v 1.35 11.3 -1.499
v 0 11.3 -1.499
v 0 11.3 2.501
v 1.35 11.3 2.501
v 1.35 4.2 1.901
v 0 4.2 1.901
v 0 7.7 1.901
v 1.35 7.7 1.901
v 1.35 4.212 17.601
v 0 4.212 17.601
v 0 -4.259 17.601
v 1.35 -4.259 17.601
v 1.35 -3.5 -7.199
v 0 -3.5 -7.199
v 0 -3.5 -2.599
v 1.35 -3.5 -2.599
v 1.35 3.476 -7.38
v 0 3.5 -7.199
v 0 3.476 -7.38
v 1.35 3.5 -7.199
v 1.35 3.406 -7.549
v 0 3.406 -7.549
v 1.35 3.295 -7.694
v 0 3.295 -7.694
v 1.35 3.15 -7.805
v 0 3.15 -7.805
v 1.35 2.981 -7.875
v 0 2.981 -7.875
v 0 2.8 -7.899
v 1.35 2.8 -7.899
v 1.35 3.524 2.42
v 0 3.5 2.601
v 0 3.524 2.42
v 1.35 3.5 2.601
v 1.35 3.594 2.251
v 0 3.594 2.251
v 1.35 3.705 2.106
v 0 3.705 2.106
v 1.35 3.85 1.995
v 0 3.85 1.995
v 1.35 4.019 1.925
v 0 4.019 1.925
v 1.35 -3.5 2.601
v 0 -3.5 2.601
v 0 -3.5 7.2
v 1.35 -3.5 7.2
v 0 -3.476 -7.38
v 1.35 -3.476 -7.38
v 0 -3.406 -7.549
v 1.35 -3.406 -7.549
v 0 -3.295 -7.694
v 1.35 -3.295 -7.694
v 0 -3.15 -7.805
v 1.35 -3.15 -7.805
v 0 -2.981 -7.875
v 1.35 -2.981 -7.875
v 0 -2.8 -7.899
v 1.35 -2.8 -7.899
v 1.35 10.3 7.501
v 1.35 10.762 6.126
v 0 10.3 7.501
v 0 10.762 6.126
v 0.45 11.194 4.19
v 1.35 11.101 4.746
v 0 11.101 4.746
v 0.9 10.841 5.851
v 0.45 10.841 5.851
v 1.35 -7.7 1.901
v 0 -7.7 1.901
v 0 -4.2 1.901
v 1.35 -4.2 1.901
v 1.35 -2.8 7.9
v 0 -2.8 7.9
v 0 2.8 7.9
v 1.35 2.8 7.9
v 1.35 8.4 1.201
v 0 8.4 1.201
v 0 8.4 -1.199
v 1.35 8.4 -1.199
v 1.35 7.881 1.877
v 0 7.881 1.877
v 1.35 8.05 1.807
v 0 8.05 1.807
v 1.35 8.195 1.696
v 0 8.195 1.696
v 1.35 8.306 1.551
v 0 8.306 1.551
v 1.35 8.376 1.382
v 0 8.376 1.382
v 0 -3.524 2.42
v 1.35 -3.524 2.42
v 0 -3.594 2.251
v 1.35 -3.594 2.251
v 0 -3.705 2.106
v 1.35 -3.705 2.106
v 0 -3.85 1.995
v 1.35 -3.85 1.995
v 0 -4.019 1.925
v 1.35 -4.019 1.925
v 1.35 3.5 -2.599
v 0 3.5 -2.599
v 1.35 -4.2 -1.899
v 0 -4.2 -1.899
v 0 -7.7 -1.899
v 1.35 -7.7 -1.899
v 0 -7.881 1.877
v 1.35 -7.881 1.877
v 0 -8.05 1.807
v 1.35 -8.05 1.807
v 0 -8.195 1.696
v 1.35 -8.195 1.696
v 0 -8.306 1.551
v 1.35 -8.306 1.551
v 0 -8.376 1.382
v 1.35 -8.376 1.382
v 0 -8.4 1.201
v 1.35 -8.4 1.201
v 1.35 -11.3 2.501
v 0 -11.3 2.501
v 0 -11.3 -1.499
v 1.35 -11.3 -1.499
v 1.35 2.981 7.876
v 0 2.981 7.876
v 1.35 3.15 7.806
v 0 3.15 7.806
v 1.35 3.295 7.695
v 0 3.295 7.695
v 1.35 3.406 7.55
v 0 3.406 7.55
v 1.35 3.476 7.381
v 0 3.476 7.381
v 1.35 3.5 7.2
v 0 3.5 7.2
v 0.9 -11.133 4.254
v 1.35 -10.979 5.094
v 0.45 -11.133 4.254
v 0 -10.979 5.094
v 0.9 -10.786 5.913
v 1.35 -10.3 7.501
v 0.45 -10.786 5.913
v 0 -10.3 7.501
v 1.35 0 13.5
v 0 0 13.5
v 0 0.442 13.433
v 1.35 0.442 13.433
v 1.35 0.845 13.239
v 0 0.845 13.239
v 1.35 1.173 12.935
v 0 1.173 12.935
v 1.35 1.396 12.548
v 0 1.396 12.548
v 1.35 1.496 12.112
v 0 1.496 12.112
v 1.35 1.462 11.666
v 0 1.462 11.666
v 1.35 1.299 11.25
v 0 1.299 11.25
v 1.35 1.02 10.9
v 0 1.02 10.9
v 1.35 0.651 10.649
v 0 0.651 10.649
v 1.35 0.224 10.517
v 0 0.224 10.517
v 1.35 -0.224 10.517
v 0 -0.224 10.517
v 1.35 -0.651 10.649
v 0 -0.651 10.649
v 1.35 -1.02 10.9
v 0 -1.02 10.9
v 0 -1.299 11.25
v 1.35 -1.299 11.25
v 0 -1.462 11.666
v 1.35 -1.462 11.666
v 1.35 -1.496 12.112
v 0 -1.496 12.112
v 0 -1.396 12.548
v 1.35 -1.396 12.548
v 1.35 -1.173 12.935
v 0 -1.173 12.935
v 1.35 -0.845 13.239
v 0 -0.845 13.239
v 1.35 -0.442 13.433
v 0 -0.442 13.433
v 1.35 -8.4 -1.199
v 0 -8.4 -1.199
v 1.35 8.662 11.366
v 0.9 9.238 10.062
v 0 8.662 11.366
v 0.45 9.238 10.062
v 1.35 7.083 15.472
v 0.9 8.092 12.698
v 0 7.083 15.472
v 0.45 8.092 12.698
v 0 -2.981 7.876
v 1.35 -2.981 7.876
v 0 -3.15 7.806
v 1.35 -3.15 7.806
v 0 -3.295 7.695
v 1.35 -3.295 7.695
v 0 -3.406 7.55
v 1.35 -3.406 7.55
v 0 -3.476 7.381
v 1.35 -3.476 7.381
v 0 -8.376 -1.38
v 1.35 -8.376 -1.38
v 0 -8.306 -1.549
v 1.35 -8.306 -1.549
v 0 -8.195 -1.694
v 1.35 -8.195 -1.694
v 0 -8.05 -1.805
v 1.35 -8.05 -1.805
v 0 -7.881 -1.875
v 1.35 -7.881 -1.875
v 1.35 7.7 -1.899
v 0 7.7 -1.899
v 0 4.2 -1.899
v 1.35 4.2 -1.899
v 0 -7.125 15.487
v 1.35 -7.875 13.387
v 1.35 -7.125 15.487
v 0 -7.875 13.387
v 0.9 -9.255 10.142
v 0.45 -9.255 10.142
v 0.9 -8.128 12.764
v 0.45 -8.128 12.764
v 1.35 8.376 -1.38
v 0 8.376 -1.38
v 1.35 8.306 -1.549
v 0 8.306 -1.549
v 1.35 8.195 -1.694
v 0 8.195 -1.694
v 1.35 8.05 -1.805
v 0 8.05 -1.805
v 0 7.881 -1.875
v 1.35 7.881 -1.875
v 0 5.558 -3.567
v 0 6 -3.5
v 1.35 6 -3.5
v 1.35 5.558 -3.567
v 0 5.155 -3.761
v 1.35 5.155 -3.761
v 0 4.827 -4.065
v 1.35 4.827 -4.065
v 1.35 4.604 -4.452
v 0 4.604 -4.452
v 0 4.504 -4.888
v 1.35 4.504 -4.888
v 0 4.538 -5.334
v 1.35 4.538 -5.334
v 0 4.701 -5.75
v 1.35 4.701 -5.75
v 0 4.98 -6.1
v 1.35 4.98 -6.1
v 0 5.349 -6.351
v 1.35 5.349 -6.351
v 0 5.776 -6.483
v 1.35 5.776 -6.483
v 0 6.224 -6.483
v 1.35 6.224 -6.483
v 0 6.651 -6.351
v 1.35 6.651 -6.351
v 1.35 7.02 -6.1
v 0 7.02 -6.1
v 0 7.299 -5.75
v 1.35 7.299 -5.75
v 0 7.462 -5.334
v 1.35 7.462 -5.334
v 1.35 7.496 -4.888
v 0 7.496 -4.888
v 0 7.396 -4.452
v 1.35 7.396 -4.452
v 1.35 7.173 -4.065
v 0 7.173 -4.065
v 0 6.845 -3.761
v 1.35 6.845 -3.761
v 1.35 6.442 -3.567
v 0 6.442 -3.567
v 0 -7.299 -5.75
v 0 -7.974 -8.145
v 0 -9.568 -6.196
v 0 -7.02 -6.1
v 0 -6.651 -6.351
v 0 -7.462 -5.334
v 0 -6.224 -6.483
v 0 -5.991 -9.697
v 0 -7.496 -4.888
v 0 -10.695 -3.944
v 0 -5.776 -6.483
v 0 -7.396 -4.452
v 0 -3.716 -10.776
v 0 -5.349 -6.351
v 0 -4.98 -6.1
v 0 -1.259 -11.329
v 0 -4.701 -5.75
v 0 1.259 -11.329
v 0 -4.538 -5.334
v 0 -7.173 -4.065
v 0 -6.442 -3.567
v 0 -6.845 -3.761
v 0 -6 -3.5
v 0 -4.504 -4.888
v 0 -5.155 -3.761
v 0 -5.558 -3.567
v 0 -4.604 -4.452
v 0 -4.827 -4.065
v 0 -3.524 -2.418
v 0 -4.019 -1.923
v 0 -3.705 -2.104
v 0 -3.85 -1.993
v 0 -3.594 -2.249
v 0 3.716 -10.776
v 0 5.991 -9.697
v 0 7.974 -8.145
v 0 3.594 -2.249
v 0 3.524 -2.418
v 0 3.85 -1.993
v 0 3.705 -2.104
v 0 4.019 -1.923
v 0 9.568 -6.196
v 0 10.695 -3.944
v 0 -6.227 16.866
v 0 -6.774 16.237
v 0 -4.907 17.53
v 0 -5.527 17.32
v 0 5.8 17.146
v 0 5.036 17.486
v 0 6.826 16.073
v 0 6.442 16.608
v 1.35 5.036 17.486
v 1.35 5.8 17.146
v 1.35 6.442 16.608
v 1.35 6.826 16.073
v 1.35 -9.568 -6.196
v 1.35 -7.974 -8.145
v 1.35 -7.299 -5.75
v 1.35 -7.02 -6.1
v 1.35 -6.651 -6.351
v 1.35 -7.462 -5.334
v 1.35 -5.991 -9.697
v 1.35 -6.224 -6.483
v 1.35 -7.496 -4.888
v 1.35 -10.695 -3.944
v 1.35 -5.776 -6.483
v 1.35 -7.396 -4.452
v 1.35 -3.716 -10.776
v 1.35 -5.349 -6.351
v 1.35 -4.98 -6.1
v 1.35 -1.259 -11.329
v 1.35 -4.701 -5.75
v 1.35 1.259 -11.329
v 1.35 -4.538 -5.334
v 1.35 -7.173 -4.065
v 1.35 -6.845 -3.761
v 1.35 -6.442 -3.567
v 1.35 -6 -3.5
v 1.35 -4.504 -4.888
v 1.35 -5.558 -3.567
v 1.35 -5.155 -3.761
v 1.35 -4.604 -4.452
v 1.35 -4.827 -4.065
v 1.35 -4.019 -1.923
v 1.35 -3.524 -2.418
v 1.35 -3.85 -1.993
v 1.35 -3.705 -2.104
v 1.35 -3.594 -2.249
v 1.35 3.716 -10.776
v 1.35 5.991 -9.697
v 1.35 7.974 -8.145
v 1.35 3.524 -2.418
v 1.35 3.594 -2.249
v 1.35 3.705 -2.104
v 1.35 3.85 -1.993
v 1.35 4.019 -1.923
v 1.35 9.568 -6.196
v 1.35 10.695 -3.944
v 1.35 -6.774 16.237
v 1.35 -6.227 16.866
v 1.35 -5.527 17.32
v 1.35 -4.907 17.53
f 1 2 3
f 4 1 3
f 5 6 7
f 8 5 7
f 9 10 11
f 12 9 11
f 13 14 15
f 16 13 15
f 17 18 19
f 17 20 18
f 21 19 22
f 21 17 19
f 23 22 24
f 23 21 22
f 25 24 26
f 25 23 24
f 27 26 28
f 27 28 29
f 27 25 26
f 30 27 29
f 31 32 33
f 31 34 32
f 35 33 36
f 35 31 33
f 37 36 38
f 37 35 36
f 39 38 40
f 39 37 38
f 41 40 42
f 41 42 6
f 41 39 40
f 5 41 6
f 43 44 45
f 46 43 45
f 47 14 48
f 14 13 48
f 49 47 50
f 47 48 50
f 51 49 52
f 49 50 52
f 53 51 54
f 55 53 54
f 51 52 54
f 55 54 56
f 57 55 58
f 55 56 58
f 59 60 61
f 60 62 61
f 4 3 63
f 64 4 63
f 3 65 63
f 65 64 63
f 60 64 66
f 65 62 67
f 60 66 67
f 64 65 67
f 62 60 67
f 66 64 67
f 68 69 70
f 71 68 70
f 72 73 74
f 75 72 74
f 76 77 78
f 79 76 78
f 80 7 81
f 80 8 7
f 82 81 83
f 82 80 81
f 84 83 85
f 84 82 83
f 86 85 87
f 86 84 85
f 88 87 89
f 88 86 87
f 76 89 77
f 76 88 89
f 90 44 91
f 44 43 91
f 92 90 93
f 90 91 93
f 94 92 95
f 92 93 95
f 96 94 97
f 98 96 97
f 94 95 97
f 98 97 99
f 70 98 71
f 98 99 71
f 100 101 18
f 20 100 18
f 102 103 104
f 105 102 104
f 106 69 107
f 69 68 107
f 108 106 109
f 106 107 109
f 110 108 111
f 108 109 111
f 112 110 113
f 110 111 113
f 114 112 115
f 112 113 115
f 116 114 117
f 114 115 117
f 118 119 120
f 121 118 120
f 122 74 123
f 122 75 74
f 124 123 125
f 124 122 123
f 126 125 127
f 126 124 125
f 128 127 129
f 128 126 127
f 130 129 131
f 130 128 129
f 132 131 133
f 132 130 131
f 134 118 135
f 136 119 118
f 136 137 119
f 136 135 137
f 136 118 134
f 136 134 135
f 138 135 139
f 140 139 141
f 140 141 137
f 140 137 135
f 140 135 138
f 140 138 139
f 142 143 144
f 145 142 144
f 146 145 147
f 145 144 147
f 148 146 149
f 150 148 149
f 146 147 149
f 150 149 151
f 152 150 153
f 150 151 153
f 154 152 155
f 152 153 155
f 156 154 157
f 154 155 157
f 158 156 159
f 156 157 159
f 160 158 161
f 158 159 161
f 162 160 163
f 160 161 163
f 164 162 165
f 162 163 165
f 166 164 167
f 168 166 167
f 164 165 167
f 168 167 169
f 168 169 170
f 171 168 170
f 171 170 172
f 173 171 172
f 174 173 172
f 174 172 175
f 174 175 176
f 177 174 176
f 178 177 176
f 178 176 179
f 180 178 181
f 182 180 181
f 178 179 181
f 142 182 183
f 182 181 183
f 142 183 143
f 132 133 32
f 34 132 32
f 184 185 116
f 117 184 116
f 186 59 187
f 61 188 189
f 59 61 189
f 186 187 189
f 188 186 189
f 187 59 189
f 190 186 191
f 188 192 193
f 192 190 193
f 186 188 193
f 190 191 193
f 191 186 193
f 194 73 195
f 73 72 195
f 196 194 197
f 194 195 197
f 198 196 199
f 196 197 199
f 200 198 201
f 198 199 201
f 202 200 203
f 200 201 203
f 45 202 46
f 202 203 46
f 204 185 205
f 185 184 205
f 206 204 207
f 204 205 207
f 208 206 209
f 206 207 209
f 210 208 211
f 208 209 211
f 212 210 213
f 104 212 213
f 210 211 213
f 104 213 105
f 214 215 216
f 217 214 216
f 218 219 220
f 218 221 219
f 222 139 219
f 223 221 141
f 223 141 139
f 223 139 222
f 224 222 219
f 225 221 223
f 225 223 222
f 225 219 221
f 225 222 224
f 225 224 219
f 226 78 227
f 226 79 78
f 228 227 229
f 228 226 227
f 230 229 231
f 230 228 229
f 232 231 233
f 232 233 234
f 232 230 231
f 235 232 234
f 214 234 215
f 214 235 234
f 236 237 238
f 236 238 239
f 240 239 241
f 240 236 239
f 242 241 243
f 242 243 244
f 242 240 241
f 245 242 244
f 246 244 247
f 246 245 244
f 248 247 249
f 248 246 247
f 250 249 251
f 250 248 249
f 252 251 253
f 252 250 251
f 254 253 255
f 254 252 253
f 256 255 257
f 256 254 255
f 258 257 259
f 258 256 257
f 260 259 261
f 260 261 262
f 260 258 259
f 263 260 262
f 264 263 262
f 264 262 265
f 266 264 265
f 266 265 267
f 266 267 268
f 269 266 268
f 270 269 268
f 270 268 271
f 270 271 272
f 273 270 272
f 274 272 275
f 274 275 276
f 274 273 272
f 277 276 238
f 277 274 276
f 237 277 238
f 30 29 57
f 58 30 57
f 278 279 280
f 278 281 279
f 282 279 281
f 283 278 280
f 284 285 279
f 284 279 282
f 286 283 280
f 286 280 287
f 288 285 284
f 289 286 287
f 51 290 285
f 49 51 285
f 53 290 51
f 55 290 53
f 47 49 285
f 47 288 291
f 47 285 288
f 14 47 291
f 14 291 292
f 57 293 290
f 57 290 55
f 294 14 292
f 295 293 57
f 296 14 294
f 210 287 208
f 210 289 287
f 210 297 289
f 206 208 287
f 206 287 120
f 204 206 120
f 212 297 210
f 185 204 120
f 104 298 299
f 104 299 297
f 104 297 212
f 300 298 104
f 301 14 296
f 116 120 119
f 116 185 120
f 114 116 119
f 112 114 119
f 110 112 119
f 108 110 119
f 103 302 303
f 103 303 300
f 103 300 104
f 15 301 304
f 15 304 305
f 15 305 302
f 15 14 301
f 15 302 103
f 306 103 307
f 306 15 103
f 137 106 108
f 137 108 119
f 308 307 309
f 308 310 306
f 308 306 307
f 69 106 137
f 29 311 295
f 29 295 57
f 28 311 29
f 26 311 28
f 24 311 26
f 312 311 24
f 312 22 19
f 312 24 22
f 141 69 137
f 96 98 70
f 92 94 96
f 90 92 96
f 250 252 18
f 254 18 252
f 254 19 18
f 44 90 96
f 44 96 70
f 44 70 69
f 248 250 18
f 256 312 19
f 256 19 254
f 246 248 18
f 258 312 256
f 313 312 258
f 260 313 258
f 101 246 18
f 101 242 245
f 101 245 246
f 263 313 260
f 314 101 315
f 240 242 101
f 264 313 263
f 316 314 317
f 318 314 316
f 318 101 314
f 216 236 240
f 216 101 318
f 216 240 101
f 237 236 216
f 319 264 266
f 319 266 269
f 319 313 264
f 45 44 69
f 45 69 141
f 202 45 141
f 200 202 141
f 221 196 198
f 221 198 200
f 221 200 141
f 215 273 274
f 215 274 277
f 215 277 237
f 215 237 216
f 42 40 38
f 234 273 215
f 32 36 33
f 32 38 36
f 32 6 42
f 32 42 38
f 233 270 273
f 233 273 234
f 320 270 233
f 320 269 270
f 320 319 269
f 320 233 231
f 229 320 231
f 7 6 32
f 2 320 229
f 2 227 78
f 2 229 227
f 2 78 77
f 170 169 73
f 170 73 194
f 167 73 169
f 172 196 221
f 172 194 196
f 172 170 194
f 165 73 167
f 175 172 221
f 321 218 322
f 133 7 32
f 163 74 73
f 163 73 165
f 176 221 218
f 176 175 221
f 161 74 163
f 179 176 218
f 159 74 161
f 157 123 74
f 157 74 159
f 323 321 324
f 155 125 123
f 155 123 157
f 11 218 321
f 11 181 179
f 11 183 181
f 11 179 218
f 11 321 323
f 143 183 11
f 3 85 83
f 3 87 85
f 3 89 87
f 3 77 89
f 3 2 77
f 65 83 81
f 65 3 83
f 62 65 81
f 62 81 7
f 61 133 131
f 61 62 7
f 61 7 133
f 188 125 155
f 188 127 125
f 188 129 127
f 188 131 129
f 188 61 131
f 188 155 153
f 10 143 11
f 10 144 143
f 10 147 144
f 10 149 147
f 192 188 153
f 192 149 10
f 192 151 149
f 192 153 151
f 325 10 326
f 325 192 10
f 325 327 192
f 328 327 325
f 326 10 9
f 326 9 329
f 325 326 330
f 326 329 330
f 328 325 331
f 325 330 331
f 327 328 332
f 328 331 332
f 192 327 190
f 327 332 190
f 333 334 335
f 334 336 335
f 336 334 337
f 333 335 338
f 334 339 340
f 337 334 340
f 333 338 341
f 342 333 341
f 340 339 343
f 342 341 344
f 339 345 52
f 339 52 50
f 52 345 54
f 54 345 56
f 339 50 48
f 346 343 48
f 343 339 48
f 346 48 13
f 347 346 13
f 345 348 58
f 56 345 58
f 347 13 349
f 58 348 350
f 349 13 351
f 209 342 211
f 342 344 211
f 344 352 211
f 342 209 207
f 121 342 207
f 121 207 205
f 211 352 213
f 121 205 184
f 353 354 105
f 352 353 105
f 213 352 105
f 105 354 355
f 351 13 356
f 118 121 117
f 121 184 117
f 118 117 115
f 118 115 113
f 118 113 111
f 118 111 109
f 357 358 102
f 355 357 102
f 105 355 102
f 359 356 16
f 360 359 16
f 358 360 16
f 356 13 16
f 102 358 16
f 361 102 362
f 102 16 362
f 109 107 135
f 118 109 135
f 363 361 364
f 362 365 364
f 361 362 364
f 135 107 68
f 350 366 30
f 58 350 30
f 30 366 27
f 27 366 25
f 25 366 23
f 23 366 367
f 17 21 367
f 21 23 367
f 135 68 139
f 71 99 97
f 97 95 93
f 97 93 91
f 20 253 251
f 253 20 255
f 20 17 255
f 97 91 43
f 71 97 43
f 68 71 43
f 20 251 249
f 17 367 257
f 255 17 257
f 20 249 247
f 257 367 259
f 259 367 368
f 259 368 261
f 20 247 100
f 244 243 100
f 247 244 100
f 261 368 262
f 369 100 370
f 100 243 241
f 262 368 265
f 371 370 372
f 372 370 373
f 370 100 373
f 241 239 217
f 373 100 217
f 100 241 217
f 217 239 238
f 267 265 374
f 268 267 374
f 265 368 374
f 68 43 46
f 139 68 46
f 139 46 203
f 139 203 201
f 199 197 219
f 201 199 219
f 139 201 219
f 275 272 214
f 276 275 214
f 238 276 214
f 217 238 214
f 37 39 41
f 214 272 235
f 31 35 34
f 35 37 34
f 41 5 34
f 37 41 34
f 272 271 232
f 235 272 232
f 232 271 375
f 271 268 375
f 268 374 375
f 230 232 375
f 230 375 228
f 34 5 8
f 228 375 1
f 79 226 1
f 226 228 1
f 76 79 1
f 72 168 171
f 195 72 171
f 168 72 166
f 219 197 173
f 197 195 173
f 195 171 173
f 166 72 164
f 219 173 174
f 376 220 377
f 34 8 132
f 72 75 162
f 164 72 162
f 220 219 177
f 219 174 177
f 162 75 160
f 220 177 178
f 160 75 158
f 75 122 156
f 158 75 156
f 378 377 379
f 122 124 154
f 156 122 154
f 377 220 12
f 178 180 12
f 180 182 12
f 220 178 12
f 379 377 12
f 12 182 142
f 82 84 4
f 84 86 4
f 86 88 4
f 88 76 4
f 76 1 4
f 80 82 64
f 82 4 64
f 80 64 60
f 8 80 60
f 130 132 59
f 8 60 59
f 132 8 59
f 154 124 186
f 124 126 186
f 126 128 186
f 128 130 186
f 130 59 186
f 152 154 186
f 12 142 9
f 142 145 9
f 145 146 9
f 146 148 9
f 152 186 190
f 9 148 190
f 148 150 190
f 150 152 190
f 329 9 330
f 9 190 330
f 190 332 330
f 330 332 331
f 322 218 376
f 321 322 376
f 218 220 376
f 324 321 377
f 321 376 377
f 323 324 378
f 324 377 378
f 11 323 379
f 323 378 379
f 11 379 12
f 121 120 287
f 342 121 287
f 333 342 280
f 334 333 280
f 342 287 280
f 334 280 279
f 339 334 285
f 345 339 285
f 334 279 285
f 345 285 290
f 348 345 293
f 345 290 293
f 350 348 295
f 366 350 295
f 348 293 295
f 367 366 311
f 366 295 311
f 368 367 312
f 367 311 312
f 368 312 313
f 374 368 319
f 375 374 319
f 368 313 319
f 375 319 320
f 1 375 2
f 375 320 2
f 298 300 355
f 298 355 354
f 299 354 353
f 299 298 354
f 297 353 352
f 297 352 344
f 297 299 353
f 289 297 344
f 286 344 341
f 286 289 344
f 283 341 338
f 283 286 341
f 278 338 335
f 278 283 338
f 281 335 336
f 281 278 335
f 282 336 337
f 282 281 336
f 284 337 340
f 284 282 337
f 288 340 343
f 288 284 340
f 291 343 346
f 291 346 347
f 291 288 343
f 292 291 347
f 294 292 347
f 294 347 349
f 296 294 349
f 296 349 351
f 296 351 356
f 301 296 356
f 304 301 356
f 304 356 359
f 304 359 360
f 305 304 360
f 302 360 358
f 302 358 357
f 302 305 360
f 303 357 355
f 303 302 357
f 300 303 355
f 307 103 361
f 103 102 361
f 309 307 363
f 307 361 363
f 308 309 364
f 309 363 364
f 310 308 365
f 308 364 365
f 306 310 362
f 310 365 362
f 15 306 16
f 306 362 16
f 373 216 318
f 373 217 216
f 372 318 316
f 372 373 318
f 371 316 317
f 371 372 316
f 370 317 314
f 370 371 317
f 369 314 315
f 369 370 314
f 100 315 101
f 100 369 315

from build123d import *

# Parameters (mm, degrees)
SCHIZZO1_R                   = 1.5
ESTRUSIONE_ESTRUSIONE1_DEPTH = 1.35
RACCORDO2_R                  = 3
RACCORDO3_R                  = 3
RACCORDO4_R                  = 0.7


with BuildPart() as part:
    # Schizzo1 → Estrusione-Estrusione1 (new body)
    with BuildSketch(Plane(origin=(0, 0, 0), x_dir=(0, 0, -1), z_dir=(1, 0, 0))):
        with BuildLine():
            add(Edge.make_bspline(
                [(-7.501010101, -10.3), (-10.845030199, -9.13986581), (-13.865102381, -7.304364218), (-17.601010101, -6.594005849)],
                knots=[0.271280726, 0.271280726, 0.271280726, 0.271280726, 0.852483684, 0.852483684, 0.852483684, 0.852483684], degree=3))
            add(Edge.make_bspline(
                [(-2.501010101, -11.3), (-4.308742426, -11.235865063), (-5.940164296, -10.841501107), (-7.501010101, -10.3)],
                knots=[0, 0, 0, 0, 0.271280726, 0.271280726, 0.271280726, 0.271280726], degree=3))
            Line((-2.501010101, -11.3), (1.498989899, -11.3))
            ThreePointArc((1.498989899, -11.3), (11.398989899, 0), (1.498989899, 11.3))
            Line((1.498989899, 11.3), (-2.501010101, 11.3))
            add(Edge.make_bspline(
                [(-2.501010101, 11.3), (-4.209338931, 11.338090952), (-5.850739142, 10.914740779), (-7.501010101, 10.3)],
                knots=[0, 0, 0, 0, 0.293888871, 0.293888871, 0.293888871, 0.293888871], degree=3))
            add(Edge.make_bspline(
                [(-7.501010101, 10.3), (-10.658273676, 9.123890914), (-13.848006436, 7.247243694), (-17.601010101, 6.561146452)],
                knots=[0.293888871, 0.293888871, 0.293888871, 0.293888871, 0.856150858, 0.856150858, 0.856150858, 0.856150858], degree=3))
            Line((-17.601010101, 6.561146452), (-17.601010101, 0))
            Line((-17.601010101, 0), (-17.601010101, -6.594005849))
        make_face()
        with Locations(Location((5, -6, 0), (0, 0, 180))):
            Circle(SCHIZZO1_R, mode=Mode.SUBTRACT)
        with BuildLine():
            ThreePointArc((-10.5, 0), (-12, -1.5), (-13.5, 0))
            ThreePointArc((-13.5, 0), (-12, 1.5), (-10.5, 0))
        make_face(mode=Mode.SUBTRACT)
        Polygon((-7.9, -3.5), (-7.9, 0), (-7.9, 3.5), (-1.901010101, 3.5), (-1.901010101, 8.4), (1.898989899, 8.4), (1.898989899, 3.5), (7.898989899, 3.5), (7.898989899, -3.5), (1.898989899, -3.5), (1.898989899, -8.4), (-1.901010101, -8.4), (-1.901010101, -3.5), align=None, mode=Mode.SUBTRACT)
        with Locations(Location((5, 6, 0), (0, 0, 180))):
            Circle(SCHIZZO1_R, mode=Mode.SUBTRACT)
    extrude(amount=ESTRUSIONE_ESTRUSIONE1_DEPTH)

    # Raccordo2
    raccordo2_edges = [part.edges().sort_by_distance(p)[0] for p in [
        (0.675, -6.594005849, 17.601010101),
    ]]
    fillet(raccordo2_edges, radius=RACCORDO2_R)

    # Raccordo3
    raccordo3_edges = [part.edges().sort_by_distance(p)[0] for p in [
        (0.675, 6.561146452, 17.601010101),
    ]]
    fillet(raccordo3_edges, radius=RACCORDO3_R)

    # Raccordo4
    raccordo4_edges = [part.edges().sort_by_distance(p)[0] for p in [
        (0.675, -3.5, 1.901010101),
        (0.675, -8.4, 1.901010101),
        (0.675, -8.4, -1.898989899),
        (0.675, -3.5, -1.898989899),
        (0.675, -3.5, -7.898989899),
        (0.675, 3.5, -7.898989899),
        (0.675, 3.5, -1.898989899),
        (0.675, 8.4, -1.898989899),
        (0.675, 8.4, 1.901010101),
        (0.675, 3.5, 1.901010101),
        (0.675, 3.5, 7.9),
        (0.675, -3.5, 7.9),
    ]]
    fillet(raccordo4_edges, radius=RACCORDO4_R)


solid = part.part
